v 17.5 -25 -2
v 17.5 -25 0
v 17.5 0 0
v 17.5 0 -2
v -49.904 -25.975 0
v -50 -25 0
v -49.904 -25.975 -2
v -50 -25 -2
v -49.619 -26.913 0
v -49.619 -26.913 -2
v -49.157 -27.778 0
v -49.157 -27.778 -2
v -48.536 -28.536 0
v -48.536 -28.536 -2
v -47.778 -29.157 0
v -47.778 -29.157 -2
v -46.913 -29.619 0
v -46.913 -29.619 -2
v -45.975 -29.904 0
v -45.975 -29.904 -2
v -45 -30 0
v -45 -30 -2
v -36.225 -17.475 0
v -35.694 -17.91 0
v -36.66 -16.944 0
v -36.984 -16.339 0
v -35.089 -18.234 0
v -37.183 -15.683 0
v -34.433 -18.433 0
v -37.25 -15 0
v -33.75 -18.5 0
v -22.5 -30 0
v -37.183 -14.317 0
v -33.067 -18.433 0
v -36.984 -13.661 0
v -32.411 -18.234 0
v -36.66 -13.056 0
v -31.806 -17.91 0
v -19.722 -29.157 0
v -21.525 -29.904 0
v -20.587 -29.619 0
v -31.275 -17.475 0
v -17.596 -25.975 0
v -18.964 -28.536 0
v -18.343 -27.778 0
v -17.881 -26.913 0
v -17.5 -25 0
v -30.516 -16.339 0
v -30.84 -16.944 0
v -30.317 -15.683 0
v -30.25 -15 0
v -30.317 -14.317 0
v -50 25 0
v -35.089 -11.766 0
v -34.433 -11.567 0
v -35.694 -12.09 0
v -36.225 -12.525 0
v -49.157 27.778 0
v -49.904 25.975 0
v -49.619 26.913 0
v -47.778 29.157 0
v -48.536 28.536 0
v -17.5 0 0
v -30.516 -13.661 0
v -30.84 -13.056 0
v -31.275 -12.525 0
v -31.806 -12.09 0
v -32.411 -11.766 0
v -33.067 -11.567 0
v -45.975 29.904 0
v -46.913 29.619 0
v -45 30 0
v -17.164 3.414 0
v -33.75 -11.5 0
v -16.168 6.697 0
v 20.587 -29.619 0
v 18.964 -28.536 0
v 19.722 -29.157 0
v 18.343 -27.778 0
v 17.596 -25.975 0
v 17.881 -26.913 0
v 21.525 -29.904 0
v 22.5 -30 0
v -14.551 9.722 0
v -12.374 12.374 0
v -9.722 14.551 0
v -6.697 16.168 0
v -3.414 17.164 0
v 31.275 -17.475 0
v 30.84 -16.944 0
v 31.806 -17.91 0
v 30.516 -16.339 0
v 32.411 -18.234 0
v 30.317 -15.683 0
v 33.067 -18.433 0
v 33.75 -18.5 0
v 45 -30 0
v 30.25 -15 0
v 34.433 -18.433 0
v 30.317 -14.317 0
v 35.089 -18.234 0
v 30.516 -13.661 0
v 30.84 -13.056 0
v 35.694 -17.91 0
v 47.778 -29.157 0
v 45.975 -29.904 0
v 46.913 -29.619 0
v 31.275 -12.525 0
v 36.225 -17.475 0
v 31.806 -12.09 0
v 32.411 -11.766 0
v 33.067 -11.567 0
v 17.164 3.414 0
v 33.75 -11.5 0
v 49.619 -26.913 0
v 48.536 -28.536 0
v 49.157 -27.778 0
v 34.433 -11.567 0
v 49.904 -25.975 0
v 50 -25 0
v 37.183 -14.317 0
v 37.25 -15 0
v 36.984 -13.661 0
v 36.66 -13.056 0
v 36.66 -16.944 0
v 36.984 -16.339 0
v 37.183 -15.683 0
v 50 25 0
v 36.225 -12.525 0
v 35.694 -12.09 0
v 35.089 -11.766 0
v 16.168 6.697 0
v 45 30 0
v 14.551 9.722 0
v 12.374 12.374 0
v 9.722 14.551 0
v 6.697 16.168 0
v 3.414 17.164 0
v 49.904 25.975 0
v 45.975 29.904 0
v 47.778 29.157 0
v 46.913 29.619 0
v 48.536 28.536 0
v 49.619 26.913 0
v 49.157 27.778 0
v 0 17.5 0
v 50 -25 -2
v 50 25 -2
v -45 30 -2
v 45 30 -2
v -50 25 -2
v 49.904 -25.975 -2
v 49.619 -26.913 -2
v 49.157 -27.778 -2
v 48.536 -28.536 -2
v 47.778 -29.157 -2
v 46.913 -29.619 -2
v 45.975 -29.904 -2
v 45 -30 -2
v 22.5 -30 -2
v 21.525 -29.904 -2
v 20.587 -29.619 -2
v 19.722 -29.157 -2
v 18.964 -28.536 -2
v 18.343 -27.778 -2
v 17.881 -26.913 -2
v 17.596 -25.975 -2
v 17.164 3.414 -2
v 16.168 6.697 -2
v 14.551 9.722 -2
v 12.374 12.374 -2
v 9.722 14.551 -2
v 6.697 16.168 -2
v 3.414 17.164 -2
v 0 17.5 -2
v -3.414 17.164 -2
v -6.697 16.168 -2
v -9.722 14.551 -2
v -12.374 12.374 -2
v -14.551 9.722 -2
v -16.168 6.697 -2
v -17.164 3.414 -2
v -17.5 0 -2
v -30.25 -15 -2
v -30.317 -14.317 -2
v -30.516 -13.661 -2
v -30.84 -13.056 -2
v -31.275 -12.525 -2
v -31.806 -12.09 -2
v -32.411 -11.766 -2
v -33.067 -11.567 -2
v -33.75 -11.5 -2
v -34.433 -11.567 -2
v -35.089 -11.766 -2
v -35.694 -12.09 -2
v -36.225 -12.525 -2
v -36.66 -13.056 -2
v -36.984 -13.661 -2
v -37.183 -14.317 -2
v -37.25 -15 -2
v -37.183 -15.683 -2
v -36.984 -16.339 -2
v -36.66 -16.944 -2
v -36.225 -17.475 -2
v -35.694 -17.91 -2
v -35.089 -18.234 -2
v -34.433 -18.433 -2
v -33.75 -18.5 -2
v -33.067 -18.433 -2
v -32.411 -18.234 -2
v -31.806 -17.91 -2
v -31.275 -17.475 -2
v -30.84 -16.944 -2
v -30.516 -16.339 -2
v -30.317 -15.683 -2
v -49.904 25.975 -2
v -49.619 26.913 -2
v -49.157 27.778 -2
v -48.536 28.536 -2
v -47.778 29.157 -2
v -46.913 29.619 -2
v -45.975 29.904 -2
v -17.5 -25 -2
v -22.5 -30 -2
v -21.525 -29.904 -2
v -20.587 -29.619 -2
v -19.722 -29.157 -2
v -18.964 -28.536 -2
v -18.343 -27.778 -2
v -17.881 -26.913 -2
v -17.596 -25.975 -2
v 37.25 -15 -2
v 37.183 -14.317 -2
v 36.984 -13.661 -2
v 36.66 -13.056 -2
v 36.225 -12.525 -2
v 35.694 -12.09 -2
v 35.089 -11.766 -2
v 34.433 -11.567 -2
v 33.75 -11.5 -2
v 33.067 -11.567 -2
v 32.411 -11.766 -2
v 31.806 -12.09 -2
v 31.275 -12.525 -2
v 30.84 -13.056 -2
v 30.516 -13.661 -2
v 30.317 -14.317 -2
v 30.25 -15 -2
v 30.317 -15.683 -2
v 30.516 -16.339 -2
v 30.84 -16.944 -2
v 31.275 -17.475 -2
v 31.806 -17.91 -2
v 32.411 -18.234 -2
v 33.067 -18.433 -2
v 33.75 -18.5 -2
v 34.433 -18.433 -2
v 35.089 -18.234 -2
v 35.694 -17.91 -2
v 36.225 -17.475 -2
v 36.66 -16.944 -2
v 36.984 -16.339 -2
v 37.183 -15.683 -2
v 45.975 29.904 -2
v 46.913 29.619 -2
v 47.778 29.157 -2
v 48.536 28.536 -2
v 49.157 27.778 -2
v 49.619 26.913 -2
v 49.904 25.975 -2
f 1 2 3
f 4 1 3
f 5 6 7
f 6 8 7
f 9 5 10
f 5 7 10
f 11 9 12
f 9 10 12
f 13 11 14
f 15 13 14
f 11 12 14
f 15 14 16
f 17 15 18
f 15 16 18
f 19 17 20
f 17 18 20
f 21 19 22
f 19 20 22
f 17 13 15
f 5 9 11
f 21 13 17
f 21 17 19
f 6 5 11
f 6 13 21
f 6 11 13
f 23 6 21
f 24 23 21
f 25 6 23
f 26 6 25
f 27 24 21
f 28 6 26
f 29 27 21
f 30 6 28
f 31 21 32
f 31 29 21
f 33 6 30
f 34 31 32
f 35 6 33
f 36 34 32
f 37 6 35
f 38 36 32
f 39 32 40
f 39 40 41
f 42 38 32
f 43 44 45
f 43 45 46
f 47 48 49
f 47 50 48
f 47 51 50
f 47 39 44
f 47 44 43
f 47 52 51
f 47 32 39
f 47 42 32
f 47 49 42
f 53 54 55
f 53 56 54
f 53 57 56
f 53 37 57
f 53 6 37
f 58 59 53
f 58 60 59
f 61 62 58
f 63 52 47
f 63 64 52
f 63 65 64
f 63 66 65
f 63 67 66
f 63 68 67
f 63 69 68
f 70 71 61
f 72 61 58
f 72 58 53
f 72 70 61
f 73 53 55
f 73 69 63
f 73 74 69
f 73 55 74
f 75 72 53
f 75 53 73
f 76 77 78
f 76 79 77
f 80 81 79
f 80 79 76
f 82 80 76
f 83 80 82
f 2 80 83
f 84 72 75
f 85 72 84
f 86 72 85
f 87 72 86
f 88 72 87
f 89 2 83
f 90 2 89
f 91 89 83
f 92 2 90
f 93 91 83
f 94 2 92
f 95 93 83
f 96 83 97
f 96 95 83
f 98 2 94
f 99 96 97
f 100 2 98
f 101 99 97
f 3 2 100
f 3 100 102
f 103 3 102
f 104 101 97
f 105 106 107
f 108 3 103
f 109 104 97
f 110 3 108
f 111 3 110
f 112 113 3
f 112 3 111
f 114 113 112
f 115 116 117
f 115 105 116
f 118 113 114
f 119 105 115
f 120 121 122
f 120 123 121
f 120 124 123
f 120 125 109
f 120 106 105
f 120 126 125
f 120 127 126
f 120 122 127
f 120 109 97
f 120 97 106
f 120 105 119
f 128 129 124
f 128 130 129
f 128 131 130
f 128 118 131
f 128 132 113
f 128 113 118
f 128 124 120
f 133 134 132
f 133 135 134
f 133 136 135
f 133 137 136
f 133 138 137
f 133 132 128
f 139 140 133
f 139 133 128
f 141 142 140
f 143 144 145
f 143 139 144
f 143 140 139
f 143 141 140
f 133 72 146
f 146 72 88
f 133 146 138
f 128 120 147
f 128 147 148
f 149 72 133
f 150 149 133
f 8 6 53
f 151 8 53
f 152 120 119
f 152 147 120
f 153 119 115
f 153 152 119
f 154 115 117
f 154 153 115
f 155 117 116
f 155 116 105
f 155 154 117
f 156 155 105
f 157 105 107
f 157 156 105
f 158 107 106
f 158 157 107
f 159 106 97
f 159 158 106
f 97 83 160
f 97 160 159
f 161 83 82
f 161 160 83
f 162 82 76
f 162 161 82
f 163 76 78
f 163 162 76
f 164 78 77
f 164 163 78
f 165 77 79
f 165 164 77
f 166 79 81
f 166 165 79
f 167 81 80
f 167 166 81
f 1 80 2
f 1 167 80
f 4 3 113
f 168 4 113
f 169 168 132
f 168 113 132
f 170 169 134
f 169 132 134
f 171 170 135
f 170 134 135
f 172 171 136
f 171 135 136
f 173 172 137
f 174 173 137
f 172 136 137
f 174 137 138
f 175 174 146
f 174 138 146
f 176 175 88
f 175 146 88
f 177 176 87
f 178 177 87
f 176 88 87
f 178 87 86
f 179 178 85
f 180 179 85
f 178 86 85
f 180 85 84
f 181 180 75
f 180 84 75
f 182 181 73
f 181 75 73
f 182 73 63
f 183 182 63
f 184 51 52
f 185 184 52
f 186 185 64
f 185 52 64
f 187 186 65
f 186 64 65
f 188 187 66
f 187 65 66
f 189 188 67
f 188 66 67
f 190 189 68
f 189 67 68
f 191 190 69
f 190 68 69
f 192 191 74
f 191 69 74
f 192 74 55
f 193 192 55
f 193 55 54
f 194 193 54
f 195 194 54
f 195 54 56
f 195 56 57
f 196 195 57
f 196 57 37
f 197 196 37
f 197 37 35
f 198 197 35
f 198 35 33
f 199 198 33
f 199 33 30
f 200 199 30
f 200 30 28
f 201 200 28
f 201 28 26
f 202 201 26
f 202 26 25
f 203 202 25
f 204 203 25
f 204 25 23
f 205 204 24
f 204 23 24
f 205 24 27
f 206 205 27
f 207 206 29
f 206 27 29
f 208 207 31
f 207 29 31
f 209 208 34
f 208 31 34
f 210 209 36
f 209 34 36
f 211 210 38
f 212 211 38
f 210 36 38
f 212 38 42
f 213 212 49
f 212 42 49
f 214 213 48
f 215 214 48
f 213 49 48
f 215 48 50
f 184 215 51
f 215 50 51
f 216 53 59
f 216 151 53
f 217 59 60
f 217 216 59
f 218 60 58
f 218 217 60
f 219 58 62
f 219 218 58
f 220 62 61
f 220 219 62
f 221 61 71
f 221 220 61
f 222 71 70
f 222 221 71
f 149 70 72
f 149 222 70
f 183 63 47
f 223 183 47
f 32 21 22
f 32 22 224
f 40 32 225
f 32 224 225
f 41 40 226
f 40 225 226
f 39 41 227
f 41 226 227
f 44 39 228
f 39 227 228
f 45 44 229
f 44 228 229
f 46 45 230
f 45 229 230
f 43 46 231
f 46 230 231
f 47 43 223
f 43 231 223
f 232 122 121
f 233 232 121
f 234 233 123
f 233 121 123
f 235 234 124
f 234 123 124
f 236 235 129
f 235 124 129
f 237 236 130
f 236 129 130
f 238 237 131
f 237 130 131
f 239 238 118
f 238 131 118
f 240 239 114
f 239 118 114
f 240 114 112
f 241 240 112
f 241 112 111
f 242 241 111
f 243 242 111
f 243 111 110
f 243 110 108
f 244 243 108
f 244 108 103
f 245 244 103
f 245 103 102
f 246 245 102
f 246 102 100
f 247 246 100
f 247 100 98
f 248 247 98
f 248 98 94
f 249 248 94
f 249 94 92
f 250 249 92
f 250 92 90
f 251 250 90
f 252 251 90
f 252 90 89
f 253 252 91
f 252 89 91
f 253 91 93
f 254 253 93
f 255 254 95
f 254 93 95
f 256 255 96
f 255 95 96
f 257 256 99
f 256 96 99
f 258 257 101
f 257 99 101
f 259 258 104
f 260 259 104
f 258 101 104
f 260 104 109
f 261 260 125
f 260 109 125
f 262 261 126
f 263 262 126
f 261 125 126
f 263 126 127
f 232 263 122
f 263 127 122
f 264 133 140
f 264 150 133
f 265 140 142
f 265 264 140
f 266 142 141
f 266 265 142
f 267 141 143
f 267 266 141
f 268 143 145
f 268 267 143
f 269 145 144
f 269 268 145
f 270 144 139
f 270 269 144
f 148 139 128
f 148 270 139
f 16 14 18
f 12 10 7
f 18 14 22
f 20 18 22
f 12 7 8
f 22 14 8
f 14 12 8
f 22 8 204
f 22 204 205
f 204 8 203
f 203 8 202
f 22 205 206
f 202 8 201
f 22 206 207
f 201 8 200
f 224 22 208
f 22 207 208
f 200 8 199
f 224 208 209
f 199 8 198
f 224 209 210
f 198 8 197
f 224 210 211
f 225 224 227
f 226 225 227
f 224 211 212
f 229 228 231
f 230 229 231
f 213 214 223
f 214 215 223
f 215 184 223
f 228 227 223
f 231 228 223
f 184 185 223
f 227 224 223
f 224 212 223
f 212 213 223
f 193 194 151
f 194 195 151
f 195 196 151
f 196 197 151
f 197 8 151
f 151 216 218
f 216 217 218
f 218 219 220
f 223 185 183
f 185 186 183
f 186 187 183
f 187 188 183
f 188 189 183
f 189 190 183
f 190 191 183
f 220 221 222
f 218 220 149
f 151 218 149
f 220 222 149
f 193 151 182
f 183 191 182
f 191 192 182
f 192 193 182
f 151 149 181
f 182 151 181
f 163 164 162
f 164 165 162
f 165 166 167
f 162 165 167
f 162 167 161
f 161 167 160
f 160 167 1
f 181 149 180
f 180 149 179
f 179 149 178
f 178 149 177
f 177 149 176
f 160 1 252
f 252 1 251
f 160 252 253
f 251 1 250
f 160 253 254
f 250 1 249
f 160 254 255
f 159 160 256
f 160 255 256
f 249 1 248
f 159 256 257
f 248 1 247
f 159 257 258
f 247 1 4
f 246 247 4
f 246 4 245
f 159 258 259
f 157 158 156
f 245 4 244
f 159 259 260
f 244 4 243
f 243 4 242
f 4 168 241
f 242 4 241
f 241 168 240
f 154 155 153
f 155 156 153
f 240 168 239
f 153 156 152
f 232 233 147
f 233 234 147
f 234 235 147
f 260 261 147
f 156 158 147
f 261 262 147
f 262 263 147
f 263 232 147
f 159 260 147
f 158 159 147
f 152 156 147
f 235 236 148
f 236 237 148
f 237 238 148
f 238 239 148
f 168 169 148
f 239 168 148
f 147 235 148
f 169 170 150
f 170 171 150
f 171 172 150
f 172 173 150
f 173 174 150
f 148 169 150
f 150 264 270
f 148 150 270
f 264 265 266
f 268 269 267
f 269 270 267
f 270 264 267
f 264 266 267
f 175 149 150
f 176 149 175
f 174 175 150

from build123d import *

# Parameters (mm, degrees)
SKETCH1_W          = 100
SKETCH1_H          = 60
BASE_FLANGE1_DEPTH = 2
CUT_EXTRUDE1_DEPTH = 10
FILLET1_R          = 5
SKETCH7_R          = 3.5
CUT_EXTRUDE2_DEPTH = 10
FILLET2_R          = 5


# Sheet-metal steps are written as plain solids
with BuildPart() as part:
    # Sketch1 → Base-Flange1 (new body)
    with BuildSketch(Plane.XY):
        Rectangle(SKETCH1_W, SKETCH1_H)
    extrude(amount=-BASE_FLANGE1_DEPTH)

    # Sketch6 → Cut-Extrude1 (cut)
    with BuildSketch(Plane.XY):
        with BuildLine():
            Line((-17.5, 0), (-17.5, -30))
            Line((-17.5, -30), (17.5, -30))
            Line((17.5, -30), (17.5, 0))
            ThreePointArc((17.5, 0), (0, 17.5), (-17.5, 0))
        make_face()
    extrude(amount=-CUT_EXTRUDE1_DEPTH, mode=Mode.SUBTRACT)

    # Fillet1
    fillet1_edges = [part.edges().sort_by_distance(p)[0] for p in [
        (17.5, -30, -1),
        (50, -30, -1),
        (-50, -30, -1),
        (-50, 30, -1),
        (50, 30, -1),
    ]]
    fillet(fillet1_edges, radius=FILLET1_R)

    # Sketch7 → Cut-Extrude2 (cut)
    with BuildSketch(Plane.XY):
        with Locations((-33.75, -15)):
            Circle(SKETCH7_R)
        with Locations((33.75, -15)):
            Circle(SKETCH7_R)
    extrude(amount=-CUT_EXTRUDE2_DEPTH, mode=Mode.SUBTRACT)

    # Fillet2
    fillet2_edges = [part.edges().sort_by_distance(p)[0] for p in [
        (-17.5, -30, -1),
    ]]
    fillet(fillet2_edges, radius=FILLET2_R)


solid = part.part
